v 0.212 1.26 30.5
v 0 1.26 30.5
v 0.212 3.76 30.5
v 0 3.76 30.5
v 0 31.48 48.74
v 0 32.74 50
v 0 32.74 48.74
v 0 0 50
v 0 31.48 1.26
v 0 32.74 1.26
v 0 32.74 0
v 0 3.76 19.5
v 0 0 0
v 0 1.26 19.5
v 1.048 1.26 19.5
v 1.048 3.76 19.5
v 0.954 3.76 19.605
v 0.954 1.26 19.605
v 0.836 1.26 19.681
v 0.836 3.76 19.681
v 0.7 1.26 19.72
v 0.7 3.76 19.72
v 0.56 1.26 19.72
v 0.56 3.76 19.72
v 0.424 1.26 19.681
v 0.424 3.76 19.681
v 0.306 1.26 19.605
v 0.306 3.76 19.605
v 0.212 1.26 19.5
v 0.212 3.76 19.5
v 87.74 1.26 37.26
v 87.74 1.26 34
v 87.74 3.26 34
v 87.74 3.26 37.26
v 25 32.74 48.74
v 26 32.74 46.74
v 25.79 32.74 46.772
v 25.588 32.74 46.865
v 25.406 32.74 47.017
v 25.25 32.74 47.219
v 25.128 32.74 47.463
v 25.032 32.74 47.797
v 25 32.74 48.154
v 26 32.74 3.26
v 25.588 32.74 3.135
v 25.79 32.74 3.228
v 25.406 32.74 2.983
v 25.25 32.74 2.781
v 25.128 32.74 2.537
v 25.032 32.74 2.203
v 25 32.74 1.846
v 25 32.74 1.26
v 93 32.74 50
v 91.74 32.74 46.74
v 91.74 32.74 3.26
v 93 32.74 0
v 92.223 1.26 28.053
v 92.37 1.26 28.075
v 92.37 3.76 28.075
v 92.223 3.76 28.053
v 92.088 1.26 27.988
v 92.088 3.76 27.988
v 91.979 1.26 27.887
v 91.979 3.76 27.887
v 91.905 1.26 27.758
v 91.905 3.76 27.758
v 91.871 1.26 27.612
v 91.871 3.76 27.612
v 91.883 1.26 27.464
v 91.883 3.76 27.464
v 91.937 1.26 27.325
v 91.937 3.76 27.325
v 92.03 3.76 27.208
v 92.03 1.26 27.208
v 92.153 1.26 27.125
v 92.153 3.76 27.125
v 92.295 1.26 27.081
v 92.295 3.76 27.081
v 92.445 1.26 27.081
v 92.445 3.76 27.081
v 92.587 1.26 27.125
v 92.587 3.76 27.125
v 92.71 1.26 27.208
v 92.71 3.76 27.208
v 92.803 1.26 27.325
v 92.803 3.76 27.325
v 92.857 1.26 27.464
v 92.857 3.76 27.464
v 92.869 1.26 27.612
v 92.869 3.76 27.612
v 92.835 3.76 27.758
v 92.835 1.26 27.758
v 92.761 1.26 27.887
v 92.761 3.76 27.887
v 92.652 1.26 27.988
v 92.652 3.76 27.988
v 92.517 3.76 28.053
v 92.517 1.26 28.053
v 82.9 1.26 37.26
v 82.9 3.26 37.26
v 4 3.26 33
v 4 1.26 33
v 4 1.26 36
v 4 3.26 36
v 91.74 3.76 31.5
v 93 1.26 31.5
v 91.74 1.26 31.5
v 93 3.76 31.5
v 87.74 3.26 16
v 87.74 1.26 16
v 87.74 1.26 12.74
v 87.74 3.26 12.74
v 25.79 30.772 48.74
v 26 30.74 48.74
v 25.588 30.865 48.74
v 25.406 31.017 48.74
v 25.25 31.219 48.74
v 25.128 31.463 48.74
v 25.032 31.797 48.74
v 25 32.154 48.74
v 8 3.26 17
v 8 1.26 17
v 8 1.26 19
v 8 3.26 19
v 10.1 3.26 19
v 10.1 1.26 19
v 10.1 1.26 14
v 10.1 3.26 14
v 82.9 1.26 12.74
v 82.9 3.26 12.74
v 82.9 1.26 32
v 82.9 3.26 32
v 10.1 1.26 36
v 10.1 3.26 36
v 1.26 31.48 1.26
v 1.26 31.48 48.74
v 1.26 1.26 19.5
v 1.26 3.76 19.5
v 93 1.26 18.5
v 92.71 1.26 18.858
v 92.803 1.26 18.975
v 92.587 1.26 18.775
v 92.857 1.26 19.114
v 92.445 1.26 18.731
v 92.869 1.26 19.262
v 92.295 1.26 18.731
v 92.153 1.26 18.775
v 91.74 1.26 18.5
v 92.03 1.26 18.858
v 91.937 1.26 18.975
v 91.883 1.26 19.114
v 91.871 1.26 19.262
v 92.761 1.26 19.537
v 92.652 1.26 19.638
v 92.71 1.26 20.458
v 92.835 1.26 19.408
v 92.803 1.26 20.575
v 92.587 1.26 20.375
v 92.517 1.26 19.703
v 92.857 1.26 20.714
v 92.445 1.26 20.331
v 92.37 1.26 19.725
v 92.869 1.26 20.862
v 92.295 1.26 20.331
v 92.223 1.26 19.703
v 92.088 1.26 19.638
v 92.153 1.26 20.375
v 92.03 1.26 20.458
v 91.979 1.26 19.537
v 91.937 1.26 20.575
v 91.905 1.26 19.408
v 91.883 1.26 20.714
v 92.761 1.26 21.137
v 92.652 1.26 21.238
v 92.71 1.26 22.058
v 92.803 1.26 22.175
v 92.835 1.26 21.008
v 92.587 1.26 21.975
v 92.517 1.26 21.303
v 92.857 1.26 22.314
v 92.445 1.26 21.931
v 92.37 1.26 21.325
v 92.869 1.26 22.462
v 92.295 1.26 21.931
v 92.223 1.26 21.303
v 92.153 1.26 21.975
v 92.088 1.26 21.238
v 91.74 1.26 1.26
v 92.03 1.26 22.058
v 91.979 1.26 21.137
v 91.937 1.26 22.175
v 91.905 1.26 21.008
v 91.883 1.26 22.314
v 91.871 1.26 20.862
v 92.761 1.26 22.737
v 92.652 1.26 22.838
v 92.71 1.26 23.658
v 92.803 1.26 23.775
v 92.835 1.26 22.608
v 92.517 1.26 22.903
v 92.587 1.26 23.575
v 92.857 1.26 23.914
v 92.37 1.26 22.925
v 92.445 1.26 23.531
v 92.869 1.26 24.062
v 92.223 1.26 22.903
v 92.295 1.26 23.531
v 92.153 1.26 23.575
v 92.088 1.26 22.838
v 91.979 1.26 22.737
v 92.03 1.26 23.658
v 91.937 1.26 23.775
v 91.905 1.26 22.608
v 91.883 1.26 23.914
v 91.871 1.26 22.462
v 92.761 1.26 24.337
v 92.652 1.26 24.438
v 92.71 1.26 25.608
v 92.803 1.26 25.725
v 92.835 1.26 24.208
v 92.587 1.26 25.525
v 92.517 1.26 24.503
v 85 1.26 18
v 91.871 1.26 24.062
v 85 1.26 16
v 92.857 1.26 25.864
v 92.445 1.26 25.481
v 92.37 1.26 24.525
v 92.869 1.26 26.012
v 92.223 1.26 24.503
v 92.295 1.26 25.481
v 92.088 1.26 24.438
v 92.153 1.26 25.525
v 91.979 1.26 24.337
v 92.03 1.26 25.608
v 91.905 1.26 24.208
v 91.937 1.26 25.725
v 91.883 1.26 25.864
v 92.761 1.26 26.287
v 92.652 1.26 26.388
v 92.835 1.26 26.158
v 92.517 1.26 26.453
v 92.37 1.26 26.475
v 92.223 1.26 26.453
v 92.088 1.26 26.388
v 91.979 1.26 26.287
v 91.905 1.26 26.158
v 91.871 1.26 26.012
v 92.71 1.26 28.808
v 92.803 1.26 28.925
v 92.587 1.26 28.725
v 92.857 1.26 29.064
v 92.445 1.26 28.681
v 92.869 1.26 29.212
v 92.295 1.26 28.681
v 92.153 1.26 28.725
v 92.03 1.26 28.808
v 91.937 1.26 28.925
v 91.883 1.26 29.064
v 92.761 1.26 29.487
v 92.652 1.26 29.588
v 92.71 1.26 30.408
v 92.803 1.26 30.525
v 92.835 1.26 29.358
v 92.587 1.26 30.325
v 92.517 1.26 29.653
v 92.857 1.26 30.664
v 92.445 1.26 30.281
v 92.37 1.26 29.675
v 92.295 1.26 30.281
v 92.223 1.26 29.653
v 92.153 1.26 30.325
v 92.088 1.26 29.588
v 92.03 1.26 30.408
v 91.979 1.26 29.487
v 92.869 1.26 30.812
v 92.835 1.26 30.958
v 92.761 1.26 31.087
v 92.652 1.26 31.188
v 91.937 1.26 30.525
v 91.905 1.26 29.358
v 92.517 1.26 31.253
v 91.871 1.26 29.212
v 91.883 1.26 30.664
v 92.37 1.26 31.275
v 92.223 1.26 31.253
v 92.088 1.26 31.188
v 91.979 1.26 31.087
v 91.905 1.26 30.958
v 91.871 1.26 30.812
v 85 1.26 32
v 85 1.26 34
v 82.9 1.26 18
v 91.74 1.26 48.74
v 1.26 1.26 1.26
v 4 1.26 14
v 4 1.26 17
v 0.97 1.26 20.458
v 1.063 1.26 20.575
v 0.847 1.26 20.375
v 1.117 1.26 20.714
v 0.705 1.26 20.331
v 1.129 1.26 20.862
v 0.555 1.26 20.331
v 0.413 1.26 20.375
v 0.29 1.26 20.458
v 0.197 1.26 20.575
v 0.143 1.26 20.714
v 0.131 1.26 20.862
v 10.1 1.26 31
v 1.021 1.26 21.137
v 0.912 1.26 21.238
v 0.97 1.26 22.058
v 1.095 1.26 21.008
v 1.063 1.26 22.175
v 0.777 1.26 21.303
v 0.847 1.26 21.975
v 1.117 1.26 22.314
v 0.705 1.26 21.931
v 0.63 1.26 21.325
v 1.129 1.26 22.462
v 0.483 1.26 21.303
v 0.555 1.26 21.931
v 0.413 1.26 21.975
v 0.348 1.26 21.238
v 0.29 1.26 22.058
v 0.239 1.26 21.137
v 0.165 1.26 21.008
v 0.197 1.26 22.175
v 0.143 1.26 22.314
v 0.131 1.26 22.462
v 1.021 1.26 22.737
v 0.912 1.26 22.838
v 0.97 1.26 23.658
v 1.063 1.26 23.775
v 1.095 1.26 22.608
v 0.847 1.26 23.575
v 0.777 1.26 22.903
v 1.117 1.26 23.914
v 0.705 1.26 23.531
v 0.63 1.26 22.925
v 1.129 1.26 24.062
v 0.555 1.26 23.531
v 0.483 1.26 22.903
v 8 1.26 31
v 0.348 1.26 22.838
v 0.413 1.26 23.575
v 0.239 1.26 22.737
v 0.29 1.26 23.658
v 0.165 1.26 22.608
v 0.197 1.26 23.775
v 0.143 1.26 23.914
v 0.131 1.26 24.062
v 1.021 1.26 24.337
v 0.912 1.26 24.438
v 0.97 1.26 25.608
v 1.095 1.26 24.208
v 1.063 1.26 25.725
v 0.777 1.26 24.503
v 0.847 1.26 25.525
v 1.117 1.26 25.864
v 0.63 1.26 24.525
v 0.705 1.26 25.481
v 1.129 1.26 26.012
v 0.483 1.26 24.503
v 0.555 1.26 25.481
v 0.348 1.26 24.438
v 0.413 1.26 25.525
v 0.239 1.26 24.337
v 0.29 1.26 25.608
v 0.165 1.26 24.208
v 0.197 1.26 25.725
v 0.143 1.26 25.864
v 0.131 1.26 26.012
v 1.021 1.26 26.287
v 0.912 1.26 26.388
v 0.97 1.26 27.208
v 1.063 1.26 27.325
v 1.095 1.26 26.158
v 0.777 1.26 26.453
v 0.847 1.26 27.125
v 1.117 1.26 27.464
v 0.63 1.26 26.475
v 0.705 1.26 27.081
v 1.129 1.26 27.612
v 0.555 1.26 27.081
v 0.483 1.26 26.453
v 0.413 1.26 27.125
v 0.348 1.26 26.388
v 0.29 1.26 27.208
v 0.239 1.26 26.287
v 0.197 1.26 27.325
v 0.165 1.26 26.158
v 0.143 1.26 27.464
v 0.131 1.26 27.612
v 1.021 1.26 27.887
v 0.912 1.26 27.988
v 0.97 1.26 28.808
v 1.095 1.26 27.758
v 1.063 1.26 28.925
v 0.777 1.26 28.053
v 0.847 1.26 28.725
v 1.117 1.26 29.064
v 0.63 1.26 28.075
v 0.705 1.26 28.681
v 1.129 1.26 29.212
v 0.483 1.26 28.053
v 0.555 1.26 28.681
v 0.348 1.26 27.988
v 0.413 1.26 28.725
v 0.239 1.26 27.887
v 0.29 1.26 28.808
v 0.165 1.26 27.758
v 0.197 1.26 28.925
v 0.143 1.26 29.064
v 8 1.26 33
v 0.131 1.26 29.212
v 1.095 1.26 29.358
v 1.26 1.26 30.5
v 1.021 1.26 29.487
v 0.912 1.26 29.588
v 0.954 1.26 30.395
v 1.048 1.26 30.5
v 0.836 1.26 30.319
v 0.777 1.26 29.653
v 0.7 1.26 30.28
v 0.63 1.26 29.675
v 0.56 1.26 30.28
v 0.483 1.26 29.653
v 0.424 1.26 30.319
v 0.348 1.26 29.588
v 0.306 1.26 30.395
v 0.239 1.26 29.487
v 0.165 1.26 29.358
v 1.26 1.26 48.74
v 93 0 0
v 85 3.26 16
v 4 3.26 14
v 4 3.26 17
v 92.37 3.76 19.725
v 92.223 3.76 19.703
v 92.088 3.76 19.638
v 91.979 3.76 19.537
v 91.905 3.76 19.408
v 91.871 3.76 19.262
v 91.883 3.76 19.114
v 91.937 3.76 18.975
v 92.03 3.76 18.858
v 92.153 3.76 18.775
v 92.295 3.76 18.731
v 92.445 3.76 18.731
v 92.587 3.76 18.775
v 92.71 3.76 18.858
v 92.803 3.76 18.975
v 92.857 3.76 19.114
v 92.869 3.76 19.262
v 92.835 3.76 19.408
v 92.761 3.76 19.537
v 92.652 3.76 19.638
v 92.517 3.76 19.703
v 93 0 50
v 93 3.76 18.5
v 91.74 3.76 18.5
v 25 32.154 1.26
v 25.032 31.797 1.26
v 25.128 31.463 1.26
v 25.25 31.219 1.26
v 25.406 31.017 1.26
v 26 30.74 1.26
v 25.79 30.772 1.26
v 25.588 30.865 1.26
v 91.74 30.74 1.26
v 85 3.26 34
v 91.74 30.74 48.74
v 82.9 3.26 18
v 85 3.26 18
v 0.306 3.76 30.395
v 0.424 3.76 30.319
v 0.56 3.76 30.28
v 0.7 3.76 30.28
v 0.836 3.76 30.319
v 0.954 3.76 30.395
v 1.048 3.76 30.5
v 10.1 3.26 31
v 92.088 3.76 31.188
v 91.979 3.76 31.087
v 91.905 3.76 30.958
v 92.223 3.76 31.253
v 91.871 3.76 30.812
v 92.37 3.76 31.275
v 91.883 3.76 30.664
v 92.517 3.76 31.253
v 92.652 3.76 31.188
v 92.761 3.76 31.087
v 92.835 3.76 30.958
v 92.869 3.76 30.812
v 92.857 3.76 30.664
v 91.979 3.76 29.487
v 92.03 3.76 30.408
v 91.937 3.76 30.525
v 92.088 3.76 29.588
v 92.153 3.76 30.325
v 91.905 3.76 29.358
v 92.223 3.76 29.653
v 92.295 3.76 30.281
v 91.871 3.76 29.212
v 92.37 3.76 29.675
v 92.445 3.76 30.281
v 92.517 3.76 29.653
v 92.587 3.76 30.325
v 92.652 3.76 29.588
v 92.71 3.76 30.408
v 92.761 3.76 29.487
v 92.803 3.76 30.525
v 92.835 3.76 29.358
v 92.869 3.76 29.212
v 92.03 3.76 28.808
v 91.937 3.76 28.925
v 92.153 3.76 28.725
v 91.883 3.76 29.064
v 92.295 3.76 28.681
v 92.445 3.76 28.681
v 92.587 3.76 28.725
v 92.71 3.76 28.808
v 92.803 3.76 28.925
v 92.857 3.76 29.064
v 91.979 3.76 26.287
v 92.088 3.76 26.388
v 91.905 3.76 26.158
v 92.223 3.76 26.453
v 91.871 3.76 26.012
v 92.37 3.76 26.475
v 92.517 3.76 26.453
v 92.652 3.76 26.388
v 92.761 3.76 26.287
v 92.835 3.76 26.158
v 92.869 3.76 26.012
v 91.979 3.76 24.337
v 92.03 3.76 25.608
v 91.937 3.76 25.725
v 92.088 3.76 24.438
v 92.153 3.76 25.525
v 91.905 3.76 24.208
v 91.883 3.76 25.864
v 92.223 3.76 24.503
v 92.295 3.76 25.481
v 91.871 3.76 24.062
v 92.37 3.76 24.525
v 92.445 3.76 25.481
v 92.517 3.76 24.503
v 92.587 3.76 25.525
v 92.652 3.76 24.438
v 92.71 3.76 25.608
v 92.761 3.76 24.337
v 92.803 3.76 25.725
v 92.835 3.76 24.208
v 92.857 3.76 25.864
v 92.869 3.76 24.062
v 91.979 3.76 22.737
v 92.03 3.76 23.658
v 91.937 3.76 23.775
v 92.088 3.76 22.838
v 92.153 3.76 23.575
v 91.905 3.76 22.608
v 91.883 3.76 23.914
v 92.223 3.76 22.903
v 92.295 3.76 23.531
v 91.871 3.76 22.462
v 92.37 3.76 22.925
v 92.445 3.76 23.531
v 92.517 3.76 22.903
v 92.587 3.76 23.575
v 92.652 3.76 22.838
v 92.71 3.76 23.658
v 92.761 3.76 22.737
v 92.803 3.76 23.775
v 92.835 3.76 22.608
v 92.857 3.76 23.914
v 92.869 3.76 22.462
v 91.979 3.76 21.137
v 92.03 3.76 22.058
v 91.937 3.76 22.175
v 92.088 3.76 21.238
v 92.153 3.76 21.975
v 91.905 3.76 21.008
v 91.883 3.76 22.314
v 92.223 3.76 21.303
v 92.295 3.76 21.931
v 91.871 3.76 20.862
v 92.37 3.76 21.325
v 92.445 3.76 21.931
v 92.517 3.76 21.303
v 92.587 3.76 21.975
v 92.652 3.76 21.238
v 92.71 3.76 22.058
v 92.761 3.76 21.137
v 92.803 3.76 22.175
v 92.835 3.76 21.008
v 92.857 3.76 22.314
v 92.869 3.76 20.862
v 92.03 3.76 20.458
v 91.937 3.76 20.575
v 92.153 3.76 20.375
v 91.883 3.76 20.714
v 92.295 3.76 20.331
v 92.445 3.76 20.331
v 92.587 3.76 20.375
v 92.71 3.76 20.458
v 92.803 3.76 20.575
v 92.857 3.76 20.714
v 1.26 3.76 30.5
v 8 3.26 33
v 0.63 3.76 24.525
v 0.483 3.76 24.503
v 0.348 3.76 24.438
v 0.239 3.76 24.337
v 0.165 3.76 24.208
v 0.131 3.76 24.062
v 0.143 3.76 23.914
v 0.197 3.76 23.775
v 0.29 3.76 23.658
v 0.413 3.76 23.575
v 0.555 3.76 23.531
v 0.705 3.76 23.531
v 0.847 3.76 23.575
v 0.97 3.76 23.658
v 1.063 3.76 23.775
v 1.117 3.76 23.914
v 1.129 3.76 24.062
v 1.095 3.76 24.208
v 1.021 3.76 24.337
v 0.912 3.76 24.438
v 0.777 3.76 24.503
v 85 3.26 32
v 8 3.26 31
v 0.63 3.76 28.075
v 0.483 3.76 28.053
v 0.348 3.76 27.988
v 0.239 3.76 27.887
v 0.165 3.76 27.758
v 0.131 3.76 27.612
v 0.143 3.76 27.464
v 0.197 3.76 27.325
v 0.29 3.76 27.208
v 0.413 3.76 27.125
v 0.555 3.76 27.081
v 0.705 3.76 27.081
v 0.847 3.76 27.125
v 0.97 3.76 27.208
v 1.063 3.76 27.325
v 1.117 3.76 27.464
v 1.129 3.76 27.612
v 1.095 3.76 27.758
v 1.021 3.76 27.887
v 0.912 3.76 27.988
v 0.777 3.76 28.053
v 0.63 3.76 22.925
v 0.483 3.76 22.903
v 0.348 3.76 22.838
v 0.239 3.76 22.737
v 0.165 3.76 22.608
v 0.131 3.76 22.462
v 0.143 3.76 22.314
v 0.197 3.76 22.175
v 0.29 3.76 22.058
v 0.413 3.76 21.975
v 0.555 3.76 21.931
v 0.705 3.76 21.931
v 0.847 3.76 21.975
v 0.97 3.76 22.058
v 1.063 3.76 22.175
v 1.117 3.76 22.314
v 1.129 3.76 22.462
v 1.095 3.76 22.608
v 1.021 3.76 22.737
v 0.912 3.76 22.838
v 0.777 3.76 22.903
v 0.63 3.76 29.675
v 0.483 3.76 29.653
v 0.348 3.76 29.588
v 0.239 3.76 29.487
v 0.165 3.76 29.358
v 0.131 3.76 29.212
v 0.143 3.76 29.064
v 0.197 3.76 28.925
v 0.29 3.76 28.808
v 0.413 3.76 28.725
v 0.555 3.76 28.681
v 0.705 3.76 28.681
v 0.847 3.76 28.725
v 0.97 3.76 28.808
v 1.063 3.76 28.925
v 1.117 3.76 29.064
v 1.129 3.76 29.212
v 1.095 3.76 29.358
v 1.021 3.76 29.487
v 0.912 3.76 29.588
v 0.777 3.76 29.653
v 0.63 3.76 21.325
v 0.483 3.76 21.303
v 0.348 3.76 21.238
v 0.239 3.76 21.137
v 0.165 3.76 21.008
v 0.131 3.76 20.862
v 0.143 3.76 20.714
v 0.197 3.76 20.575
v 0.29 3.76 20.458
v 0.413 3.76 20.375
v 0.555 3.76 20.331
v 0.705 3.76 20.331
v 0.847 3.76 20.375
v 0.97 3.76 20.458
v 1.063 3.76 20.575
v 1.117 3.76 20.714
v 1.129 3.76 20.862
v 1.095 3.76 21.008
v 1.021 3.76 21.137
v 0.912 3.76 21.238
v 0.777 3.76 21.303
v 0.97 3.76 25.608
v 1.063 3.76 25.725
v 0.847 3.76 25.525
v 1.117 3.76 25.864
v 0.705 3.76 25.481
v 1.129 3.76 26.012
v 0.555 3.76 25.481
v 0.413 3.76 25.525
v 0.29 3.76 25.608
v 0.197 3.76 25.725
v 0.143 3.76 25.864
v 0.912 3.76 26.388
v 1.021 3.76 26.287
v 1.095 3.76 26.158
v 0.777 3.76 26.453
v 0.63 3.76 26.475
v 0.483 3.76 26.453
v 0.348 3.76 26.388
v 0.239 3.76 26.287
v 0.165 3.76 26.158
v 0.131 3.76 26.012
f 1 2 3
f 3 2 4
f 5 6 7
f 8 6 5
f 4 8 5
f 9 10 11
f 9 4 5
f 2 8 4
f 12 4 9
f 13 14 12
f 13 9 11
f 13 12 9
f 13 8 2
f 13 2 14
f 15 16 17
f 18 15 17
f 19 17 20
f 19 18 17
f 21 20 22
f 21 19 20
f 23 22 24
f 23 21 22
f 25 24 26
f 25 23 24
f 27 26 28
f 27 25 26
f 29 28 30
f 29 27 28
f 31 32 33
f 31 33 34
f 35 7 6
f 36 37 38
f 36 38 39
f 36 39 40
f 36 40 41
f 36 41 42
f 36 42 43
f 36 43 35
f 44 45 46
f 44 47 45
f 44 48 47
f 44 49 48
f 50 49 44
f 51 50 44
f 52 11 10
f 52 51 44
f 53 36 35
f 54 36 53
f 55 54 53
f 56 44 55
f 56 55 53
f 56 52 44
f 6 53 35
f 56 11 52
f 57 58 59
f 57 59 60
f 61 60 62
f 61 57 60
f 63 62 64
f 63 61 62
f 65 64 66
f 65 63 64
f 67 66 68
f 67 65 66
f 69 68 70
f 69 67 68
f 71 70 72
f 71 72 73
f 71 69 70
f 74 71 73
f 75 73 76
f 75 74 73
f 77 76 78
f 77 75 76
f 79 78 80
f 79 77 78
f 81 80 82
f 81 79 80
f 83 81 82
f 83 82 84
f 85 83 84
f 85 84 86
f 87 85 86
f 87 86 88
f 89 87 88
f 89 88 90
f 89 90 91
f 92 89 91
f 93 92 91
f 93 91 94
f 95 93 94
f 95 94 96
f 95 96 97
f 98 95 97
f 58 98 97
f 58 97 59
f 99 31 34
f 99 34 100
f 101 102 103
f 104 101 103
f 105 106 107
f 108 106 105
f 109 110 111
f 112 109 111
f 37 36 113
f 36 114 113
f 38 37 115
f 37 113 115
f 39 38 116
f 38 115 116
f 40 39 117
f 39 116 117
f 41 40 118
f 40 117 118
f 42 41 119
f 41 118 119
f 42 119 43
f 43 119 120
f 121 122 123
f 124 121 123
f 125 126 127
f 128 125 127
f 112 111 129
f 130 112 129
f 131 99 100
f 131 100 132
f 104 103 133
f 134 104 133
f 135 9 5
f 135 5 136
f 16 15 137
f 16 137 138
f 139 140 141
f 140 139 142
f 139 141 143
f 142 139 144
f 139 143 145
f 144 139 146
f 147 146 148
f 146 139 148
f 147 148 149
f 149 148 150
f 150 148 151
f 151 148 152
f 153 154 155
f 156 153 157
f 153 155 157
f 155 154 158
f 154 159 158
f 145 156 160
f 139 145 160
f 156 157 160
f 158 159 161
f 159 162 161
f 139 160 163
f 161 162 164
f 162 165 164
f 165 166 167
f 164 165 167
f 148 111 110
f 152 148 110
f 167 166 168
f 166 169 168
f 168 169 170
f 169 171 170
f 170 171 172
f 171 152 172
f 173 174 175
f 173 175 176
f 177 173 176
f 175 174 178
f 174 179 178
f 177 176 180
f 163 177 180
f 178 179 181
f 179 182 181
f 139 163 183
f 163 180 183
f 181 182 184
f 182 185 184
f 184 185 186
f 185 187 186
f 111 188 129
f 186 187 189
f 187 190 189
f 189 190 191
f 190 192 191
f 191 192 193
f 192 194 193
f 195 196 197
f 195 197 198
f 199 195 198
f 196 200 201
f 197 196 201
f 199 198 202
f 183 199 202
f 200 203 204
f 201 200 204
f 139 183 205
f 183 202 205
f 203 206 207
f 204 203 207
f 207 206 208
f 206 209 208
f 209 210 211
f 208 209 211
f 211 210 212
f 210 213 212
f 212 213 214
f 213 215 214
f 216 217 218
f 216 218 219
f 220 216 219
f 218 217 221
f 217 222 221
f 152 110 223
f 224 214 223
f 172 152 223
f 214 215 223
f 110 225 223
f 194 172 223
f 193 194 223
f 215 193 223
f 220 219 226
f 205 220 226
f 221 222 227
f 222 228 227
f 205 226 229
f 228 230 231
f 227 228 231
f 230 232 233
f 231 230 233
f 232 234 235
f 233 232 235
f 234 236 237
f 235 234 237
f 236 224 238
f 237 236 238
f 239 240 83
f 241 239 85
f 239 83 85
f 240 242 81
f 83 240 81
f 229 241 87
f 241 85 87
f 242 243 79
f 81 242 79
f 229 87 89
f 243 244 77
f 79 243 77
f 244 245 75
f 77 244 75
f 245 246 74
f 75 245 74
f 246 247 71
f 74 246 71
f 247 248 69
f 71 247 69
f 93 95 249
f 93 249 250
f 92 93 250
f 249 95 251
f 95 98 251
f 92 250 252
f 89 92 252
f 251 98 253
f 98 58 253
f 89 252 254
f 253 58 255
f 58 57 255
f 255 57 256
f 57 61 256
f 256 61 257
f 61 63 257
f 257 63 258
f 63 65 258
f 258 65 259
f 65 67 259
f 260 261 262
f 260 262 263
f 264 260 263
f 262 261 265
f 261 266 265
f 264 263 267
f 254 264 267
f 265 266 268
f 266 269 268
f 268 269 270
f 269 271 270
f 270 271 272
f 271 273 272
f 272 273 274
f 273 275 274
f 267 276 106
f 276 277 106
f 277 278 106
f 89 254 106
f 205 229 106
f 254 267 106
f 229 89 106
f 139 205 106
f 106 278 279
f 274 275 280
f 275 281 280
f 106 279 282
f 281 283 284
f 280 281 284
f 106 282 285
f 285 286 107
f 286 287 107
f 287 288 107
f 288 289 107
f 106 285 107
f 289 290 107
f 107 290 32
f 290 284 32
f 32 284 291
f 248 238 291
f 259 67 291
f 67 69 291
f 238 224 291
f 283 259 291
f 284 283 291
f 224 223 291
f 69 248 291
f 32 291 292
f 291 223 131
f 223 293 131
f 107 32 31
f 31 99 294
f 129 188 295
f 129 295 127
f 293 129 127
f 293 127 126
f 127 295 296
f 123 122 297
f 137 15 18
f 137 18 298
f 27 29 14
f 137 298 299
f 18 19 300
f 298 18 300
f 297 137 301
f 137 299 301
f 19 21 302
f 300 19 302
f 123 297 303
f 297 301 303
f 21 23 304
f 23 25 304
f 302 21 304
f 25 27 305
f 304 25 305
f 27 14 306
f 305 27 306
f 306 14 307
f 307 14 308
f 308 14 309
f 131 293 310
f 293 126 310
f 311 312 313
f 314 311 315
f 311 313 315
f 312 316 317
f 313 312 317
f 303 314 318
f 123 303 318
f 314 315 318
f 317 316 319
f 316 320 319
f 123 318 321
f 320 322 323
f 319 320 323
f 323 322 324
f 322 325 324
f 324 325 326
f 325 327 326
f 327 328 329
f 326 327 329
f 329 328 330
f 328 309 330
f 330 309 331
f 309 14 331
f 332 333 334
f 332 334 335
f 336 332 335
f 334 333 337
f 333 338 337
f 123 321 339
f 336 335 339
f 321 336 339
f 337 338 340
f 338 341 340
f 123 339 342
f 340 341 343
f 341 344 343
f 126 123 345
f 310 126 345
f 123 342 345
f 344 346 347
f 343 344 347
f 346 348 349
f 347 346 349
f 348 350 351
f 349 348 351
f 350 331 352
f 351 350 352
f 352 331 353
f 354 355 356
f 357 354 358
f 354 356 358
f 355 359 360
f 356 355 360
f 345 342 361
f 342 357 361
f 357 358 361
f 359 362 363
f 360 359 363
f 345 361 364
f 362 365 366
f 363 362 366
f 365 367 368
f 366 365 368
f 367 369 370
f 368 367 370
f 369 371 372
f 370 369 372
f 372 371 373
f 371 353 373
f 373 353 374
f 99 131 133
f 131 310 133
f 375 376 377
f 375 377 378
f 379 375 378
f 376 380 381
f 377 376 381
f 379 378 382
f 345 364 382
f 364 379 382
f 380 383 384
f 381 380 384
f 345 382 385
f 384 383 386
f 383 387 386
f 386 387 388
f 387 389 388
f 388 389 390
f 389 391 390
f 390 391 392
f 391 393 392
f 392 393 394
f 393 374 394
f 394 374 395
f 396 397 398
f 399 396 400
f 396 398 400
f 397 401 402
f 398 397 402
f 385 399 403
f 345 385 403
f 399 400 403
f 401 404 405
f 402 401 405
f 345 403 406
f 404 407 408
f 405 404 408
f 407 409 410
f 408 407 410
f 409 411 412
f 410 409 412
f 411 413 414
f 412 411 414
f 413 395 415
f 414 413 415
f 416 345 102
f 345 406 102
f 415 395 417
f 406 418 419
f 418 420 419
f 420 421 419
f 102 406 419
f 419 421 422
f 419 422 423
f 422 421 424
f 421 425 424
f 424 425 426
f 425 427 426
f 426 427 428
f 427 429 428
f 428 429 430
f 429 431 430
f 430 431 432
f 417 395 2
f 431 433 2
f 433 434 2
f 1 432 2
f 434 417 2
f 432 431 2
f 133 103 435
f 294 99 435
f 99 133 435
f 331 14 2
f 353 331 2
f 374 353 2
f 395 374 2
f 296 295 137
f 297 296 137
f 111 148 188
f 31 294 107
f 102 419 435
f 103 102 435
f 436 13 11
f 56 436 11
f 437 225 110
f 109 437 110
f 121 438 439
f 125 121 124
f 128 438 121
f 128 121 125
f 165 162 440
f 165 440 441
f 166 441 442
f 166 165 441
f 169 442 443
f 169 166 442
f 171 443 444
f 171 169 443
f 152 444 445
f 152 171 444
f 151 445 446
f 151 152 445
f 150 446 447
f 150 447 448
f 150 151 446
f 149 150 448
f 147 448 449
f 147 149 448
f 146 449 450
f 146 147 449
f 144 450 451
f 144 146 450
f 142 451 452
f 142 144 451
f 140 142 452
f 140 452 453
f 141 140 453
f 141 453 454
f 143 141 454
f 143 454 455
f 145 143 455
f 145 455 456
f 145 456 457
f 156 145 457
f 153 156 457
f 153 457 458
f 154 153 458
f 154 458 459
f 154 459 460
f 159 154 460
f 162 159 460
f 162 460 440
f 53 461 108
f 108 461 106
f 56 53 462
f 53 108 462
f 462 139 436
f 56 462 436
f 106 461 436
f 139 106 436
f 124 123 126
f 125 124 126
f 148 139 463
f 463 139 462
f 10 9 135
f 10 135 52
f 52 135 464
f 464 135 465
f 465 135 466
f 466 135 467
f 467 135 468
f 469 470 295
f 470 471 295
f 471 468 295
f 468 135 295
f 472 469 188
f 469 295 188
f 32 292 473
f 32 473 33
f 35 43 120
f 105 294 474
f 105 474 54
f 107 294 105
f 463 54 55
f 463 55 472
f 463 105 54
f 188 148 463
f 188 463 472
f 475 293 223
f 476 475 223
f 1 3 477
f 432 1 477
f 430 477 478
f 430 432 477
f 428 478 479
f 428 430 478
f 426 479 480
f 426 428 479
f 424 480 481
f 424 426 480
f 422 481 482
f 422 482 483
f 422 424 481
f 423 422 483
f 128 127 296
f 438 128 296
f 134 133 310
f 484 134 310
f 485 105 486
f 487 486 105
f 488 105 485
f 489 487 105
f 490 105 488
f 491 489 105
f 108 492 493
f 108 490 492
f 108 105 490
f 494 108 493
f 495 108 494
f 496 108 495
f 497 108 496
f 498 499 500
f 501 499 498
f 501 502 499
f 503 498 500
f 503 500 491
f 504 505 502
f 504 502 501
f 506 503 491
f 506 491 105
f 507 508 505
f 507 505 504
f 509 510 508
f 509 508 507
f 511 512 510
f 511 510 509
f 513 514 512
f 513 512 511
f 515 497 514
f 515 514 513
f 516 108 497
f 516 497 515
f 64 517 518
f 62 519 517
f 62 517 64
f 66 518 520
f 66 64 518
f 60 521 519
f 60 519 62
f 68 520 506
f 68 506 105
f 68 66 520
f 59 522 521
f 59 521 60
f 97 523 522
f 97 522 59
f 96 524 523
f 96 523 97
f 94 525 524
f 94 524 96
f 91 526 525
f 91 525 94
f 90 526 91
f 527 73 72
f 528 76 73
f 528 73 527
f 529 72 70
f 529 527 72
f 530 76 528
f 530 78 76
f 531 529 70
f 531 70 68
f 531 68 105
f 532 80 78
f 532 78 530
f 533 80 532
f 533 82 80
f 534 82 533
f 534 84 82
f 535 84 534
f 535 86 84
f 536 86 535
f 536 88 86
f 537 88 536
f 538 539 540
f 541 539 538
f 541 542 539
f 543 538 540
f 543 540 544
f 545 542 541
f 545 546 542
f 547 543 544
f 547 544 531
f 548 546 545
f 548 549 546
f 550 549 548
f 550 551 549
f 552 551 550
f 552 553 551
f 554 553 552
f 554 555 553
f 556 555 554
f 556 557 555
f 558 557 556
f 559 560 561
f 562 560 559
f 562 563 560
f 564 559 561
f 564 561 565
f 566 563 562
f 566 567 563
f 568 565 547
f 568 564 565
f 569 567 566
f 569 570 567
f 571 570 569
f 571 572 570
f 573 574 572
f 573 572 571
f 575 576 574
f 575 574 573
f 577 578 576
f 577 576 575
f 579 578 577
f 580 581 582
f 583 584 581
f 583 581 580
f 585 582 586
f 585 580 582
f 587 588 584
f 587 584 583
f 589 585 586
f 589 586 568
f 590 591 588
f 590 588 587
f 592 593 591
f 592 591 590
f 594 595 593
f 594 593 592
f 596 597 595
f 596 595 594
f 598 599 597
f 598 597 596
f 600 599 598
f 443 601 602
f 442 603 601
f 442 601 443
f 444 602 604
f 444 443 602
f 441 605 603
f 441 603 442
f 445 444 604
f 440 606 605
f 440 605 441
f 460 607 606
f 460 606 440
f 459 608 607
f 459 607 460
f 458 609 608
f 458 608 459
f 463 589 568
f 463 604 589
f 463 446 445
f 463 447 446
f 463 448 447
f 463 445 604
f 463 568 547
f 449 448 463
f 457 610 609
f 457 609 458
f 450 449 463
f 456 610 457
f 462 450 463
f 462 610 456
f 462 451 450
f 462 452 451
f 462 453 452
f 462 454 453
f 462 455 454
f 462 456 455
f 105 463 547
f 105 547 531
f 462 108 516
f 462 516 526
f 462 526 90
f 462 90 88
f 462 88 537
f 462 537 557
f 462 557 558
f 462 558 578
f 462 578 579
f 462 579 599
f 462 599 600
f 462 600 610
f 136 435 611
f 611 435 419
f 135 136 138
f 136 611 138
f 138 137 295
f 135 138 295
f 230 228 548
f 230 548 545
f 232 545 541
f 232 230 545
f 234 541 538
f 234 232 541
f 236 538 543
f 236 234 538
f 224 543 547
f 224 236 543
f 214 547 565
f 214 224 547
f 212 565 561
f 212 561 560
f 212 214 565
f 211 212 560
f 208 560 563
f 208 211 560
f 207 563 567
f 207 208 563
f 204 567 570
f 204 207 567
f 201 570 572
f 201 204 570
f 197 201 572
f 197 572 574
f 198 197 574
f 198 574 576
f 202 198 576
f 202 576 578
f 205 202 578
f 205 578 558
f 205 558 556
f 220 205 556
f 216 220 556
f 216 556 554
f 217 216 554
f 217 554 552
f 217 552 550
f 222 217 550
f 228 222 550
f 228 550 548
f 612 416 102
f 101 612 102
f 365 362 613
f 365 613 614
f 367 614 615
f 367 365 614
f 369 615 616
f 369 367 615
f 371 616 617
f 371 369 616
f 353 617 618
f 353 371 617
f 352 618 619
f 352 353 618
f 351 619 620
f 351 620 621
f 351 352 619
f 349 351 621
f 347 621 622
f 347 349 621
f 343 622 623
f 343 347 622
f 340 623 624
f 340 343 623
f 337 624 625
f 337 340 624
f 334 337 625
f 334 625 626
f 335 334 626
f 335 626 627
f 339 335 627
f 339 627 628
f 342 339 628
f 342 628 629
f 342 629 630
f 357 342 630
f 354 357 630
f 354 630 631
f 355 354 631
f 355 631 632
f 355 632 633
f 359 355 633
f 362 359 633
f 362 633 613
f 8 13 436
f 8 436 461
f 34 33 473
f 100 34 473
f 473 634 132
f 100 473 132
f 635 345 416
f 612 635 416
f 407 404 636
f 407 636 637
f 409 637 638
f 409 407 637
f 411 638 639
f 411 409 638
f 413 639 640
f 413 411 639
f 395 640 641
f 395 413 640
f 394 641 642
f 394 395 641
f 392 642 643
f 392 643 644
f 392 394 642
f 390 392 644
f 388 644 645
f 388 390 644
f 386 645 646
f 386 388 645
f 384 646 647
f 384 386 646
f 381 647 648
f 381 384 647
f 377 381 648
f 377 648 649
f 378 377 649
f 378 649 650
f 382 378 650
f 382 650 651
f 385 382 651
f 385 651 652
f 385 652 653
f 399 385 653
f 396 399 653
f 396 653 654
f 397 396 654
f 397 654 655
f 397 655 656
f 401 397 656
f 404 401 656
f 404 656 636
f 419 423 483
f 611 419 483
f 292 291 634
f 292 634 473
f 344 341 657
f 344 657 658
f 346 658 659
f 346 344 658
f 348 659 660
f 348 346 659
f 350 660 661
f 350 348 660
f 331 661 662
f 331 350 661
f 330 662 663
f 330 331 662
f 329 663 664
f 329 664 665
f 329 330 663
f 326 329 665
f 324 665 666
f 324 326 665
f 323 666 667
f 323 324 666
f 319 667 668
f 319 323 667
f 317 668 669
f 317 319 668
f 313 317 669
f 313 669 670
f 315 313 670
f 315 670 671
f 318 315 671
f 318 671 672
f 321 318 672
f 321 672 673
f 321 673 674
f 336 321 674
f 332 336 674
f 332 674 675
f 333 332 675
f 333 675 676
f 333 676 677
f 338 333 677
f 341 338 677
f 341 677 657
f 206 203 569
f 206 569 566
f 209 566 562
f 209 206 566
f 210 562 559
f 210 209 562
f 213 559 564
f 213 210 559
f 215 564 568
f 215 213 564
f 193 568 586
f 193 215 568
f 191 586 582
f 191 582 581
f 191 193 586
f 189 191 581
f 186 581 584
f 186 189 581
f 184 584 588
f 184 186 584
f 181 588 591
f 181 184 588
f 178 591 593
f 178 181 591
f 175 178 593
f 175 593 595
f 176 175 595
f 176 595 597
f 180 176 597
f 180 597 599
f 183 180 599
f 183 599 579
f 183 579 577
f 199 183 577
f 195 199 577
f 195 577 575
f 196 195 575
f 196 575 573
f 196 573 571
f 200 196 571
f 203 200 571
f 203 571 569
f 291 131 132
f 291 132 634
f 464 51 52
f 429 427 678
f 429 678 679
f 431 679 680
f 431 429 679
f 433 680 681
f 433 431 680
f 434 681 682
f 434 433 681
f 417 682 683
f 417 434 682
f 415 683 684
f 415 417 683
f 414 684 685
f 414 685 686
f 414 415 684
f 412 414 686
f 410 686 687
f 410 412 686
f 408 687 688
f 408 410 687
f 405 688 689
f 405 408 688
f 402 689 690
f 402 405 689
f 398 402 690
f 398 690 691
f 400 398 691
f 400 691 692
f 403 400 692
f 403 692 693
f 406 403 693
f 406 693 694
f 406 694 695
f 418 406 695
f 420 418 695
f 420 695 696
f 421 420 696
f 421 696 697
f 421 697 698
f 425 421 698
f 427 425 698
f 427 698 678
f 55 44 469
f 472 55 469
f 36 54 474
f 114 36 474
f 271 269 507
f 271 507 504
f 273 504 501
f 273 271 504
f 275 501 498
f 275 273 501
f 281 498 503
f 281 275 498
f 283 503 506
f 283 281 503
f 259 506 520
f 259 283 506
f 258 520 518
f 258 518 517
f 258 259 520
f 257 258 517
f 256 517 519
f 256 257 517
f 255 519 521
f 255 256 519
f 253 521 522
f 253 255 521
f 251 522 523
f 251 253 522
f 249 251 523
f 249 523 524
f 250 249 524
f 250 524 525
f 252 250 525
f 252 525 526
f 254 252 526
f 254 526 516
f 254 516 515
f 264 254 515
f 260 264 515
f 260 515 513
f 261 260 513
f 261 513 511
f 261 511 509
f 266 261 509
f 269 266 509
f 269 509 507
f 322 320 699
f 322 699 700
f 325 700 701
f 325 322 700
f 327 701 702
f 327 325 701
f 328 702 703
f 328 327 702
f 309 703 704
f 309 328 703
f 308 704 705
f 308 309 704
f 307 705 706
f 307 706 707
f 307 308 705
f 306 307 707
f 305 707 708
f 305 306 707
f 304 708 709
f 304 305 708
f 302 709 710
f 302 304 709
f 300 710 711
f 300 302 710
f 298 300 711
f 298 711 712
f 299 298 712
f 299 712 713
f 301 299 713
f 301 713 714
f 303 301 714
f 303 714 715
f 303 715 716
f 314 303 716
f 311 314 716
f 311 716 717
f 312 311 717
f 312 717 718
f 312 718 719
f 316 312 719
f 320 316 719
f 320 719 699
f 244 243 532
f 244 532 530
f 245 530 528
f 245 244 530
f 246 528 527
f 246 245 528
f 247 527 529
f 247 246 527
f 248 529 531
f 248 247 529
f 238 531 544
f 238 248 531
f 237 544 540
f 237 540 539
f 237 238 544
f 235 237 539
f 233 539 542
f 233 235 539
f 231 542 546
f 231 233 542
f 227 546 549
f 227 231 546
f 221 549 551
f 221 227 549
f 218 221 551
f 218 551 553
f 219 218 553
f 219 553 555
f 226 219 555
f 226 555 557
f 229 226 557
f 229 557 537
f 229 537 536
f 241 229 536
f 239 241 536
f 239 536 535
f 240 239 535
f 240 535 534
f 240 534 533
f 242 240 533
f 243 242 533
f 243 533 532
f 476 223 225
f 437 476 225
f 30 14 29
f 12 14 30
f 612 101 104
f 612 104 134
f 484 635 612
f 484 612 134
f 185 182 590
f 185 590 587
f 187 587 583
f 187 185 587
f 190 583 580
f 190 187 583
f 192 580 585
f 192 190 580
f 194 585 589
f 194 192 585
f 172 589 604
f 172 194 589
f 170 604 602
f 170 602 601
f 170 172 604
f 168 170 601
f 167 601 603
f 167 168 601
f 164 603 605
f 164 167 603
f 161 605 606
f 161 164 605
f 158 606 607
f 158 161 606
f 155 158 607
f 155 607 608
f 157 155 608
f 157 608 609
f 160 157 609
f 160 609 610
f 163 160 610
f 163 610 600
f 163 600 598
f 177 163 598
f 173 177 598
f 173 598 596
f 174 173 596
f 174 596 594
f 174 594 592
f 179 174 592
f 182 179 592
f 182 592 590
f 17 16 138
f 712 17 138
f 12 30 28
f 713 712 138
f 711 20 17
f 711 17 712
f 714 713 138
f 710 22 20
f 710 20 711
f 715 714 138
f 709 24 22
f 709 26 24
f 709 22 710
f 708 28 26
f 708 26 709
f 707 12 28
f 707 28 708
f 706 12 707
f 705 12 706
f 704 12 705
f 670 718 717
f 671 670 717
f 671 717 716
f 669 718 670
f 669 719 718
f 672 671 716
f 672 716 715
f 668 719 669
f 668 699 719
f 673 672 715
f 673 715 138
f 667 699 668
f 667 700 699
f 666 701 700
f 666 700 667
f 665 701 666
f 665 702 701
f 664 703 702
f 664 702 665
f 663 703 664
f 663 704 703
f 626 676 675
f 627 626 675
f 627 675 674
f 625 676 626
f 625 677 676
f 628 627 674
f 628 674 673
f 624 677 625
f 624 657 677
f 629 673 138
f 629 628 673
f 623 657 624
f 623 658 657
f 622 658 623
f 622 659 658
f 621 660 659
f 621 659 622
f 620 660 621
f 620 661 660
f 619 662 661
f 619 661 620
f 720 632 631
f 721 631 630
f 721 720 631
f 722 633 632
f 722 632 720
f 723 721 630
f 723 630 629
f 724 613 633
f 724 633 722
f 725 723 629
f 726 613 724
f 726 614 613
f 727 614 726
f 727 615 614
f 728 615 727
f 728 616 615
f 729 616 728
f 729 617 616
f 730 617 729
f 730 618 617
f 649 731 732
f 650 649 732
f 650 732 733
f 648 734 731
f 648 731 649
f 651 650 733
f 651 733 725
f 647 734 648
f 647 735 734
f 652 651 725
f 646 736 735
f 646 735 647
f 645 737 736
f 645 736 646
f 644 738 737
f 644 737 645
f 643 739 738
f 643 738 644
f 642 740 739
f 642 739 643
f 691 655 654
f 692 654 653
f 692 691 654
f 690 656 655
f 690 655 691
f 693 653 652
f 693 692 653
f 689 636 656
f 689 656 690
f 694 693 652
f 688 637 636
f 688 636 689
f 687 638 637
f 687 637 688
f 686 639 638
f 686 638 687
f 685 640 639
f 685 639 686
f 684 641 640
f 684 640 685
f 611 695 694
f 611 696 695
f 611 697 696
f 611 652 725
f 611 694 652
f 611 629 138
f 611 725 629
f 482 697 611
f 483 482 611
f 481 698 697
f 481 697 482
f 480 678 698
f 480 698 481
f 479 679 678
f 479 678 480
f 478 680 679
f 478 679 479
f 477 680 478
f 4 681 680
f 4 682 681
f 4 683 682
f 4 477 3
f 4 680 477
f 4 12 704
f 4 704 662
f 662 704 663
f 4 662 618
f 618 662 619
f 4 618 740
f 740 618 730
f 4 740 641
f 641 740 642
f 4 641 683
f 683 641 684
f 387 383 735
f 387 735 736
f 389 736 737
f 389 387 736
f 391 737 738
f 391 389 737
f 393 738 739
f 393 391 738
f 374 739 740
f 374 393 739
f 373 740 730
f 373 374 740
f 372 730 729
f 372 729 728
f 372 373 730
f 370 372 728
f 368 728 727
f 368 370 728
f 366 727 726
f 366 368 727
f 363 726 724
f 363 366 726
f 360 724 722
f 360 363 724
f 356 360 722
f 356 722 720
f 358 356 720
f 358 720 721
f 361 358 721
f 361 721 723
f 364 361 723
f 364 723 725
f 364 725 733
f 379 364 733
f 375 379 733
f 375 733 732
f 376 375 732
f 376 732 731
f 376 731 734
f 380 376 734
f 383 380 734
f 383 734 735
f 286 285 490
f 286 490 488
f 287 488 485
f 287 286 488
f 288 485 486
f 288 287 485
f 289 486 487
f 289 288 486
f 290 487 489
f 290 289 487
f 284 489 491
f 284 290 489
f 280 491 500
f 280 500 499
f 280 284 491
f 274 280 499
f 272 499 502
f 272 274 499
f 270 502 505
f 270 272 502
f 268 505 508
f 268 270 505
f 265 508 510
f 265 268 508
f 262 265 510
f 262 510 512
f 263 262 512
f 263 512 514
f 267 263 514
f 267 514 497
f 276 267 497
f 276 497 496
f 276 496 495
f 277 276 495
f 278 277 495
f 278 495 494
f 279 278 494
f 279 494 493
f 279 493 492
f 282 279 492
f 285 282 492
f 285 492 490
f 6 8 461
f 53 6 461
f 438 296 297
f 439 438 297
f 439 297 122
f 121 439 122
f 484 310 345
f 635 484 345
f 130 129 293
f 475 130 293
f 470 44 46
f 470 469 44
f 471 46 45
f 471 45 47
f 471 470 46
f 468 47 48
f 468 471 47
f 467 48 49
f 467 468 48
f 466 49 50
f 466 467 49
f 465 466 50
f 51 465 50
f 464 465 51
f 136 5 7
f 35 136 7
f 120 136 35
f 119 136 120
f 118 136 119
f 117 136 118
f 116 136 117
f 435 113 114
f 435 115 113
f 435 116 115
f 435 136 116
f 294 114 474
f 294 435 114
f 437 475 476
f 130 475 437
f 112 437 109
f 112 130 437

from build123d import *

# Parameters (mm, degrees)
ESBO_O1_W                = 93
ESBO_O1_H                = 50
RESSALTO_EXTRUS_O1_DEPTH = 1.26
ESBO_O2_W                = 93
ESBO_O2_H                = 1.26
RESSALTO_EXTRUS_O2_DEPTH = 32.74
ESBO_O3_W                = 1.26
ESBO_O3_H                = 50
RESSALTO_EXTRUS_O4_DEPTH = 32.74
RESSALTO_EXTRUS_O5_START = 25
RESSALTO_EXTRUS_O5_DEPTH = 67
FILETE1_R                = 1
FILETE2_R                = 1
ESBO_O6_W                = 1.26
ESBO_O6_H                = 50
RESSALTO_EXTRUS_O6_DEPTH = 31.48
ESBO_O7_W                = 11
ESBO_O7_H                = 2.5
CORTE_EXTRUS_O1_DEPTH    = 1.26
ESBO_O8_W                = 13
ESBO_O8_H                = 2.5
CORTE_EXTRUS_O2_DEPTH    = 1.26
RESSALTO_EXTRUS_O7_DEPTH = 2
RESSALTO_EXTRUS_O8_DEPTH = 2
ESBO_O13_R               = 0.5
RESSALTO_EXTRUS_O9_DEPTH = 4


with BuildPart() as part:
    # Esboço1 → Ressalto-extrusão1 (new body)
    with BuildSketch(Plane(origin=(0, 0, 0), x_dir=(1, 0, 0), z_dir=(0, 1, 0))):
        with Locations((46.5, -25)):
            Rectangle(ESBO_O1_W, ESBO_O1_H)
    extrude(amount=RESSALTO_EXTRUS_O1_DEPTH)

    # Esboço2 → Ressalto-extrusão2 (add)
    with BuildSketch(Plane(origin=(0, 0, 0), x_dir=(1, 0, 0), z_dir=(0, 1, 0))):
        with Locations((46.5, -0.63)):
            Rectangle(ESBO_O2_W, ESBO_O2_H)
        with Locations((46.5, -49.37)):
            Rectangle(ESBO_O2_W, ESBO_O2_H)
    extrude(amount=RESSALTO_EXTRUS_O2_DEPTH)

    # Esboço3 → Ressalto-extrusão4 (add)
    with BuildSketch(Plane(origin=(0, 0, 0), x_dir=(1, 0, 0), z_dir=(0, 1, 0))):
        with Locations((92.37, -25)):
            Rectangle(ESBO_O3_W, ESBO_O3_H)
    extrude(amount=RESSALTO_EXTRUS_O4_DEPTH)

    # Esboço5 → Ressalto-extrusão5 (add)
    with BuildSketch(Plane(origin=(0, 0, 0), x_dir=(0, 0, -1), z_dir=(1, 0, 0)).offset(RESSALTO_EXTRUS_O5_START)):
        Polygon((0, 32.74), (-3.26, 32.74), (0, 29.48), align=None)
        Polygon((-50, 32.74), (-46.74, 32.74), (-50, 29.48), align=None)
    extrude(amount=RESSALTO_EXTRUS_O5_DEPTH)

    # Filete1
    filete1_edges = [part.edges().sort_by_distance(p)[0] for p in [
        (25, 31.74, 47.74),
    ]]
    fillet(filete1_edges, radius=FILETE1_R)

    # Filete2
    filete2_edges = [part.edges().sort_by_distance(p)[0] for p in [
        (25, 31.74, 2.26),
    ]]
    fillet(filete2_edges, radius=FILETE2_R)

    # Esboço6 → Ressalto-extrusão6 (add)
    with BuildSketch(Plane(origin=(0, 0, 0), x_dir=(1, 0, 0), z_dir=(0, 1, 0))):
        with Locations((0.63, -25)):
            Rectangle(ESBO_O6_W, ESBO_O6_H)
    extrude(amount=RESSALTO_EXTRUS_O6_DEPTH)

    # Esboço7 → Corte-extrusão1 (cut)
    with BuildSketch(Plane.ZY):
        with Locations((25, 2.51)):
            Rectangle(ESBO_O7_W, ESBO_O7_H)
    extrude(amount=-CORTE_EXTRUS_O1_DEPTH, mode=Mode.SUBTRACT)

    # Esboço8 → Corte-extrusão2 (cut)
    with BuildSketch(Plane(origin=(93, 0, 0), x_dir=(0, 0, -1), z_dir=(1, 0, 0))):
        with Locations((-25, 2.51)):
            Rectangle(ESBO_O8_W, ESBO_O8_H)
    extrude(amount=-CORTE_EXTRUS_O2_DEPTH, mode=Mode.SUBTRACT)

    # Esboço10 → Ressalto-extrusão7 (add)
    with BuildSketch(Plane(origin=(0, 1.26, 0), x_dir=(1, 0, 0), z_dir=(0, 1, 0))):
        Polygon((4, -14), (4, -17), (8, -17), (8, -19), (10.1, -19), (10.1, -14), align=None)
        Polygon((4, -33), (4, -36), (10.1, -36), (10.1, -31), (8, -31), (8, -33), align=None)
    extrude(amount=RESSALTO_EXTRUS_O7_DEPTH)

    # Esboço11 → Ressalto-extrusão8 (add)
    with BuildSketch(Plane(origin=(0, 1.26, 0), x_dir=(1, 0, 0), z_dir=(0, 1, 0))):
        Polygon((87.74, -12.74), (82.9, -12.74), (82.9, -18), (85, -18), (85, -16), (87.74, -16), align=None)
        Polygon((87.74, -34), (87.74, -37.26), (82.9, -37.26), (82.9, -32), (85, -32), (85, -34), align=None)
    extrude(amount=RESSALTO_EXTRUS_O8_DEPTH)

    # Esboço13 → Ressalto-extrusão9 (add)
    with BuildSketch(Plane.XZ):
        with Locations(Location((92.37, 30.775, 0), (0, 0, 90))):
            Circle(ESBO_O13_R)
        with Locations(Location((92.37, 29.175, 0), (0, 0, 90))):
            Circle(ESBO_O13_R)
        with Locations(Location((92.37, 27.575, 0), (0, 0, 90))):
            Circle(ESBO_O13_R)
        with Locations(Location((92.37, 25.975, 0), (0, 0, 90))):
            Circle(ESBO_O13_R)
        with Locations(Location((92.37, 24.025, 0), (0, 0, 90))):
            Circle(ESBO_O13_R)
        with Locations(Location((92.37, 22.425, 0), (0, 0, 90))):
            Circle(ESBO_O13_R)
        with Locations(Location((92.37, 20.825, 0), (0, 0, 90))):
            Circle(ESBO_O13_R)
        with Locations(Location((92.37, 19.225, 0), (0, 0, 90))):
            Circle(ESBO_O13_R)
        with Locations((0.63, 19.225)):
            Circle(ESBO_O13_R)
        with Locations(Location((0.63, 20.825, 0), (0, 0, 90))):
            Circle(ESBO_O13_R)
        with Locations(Location((0.63, 22.425, 0), (0, 0, 90))):
            Circle(ESBO_O13_R)
        with Locations(Location((0.63, 24.025, 0), (0, 0, 90))):
            Circle(ESBO_O13_R)
        with Locations(Location((0.63, 25.975, 0), (0, 0, 90))):
            Circle(ESBO_O13_R)
        with Locations(Location((0.63, 27.575, 0), (0, 0, 90))):
            Circle(ESBO_O13_R)
        with Locations(Location((0.63, 29.175, 0), (0, 0, 90))):
            Circle(ESBO_O13_R)
        with Locations((0.63, 30.775)):
            Circle(ESBO_O13_R)
    extrude(amount=-RESSALTO_EXTRUS_O9_DEPTH)


solid = part.part
